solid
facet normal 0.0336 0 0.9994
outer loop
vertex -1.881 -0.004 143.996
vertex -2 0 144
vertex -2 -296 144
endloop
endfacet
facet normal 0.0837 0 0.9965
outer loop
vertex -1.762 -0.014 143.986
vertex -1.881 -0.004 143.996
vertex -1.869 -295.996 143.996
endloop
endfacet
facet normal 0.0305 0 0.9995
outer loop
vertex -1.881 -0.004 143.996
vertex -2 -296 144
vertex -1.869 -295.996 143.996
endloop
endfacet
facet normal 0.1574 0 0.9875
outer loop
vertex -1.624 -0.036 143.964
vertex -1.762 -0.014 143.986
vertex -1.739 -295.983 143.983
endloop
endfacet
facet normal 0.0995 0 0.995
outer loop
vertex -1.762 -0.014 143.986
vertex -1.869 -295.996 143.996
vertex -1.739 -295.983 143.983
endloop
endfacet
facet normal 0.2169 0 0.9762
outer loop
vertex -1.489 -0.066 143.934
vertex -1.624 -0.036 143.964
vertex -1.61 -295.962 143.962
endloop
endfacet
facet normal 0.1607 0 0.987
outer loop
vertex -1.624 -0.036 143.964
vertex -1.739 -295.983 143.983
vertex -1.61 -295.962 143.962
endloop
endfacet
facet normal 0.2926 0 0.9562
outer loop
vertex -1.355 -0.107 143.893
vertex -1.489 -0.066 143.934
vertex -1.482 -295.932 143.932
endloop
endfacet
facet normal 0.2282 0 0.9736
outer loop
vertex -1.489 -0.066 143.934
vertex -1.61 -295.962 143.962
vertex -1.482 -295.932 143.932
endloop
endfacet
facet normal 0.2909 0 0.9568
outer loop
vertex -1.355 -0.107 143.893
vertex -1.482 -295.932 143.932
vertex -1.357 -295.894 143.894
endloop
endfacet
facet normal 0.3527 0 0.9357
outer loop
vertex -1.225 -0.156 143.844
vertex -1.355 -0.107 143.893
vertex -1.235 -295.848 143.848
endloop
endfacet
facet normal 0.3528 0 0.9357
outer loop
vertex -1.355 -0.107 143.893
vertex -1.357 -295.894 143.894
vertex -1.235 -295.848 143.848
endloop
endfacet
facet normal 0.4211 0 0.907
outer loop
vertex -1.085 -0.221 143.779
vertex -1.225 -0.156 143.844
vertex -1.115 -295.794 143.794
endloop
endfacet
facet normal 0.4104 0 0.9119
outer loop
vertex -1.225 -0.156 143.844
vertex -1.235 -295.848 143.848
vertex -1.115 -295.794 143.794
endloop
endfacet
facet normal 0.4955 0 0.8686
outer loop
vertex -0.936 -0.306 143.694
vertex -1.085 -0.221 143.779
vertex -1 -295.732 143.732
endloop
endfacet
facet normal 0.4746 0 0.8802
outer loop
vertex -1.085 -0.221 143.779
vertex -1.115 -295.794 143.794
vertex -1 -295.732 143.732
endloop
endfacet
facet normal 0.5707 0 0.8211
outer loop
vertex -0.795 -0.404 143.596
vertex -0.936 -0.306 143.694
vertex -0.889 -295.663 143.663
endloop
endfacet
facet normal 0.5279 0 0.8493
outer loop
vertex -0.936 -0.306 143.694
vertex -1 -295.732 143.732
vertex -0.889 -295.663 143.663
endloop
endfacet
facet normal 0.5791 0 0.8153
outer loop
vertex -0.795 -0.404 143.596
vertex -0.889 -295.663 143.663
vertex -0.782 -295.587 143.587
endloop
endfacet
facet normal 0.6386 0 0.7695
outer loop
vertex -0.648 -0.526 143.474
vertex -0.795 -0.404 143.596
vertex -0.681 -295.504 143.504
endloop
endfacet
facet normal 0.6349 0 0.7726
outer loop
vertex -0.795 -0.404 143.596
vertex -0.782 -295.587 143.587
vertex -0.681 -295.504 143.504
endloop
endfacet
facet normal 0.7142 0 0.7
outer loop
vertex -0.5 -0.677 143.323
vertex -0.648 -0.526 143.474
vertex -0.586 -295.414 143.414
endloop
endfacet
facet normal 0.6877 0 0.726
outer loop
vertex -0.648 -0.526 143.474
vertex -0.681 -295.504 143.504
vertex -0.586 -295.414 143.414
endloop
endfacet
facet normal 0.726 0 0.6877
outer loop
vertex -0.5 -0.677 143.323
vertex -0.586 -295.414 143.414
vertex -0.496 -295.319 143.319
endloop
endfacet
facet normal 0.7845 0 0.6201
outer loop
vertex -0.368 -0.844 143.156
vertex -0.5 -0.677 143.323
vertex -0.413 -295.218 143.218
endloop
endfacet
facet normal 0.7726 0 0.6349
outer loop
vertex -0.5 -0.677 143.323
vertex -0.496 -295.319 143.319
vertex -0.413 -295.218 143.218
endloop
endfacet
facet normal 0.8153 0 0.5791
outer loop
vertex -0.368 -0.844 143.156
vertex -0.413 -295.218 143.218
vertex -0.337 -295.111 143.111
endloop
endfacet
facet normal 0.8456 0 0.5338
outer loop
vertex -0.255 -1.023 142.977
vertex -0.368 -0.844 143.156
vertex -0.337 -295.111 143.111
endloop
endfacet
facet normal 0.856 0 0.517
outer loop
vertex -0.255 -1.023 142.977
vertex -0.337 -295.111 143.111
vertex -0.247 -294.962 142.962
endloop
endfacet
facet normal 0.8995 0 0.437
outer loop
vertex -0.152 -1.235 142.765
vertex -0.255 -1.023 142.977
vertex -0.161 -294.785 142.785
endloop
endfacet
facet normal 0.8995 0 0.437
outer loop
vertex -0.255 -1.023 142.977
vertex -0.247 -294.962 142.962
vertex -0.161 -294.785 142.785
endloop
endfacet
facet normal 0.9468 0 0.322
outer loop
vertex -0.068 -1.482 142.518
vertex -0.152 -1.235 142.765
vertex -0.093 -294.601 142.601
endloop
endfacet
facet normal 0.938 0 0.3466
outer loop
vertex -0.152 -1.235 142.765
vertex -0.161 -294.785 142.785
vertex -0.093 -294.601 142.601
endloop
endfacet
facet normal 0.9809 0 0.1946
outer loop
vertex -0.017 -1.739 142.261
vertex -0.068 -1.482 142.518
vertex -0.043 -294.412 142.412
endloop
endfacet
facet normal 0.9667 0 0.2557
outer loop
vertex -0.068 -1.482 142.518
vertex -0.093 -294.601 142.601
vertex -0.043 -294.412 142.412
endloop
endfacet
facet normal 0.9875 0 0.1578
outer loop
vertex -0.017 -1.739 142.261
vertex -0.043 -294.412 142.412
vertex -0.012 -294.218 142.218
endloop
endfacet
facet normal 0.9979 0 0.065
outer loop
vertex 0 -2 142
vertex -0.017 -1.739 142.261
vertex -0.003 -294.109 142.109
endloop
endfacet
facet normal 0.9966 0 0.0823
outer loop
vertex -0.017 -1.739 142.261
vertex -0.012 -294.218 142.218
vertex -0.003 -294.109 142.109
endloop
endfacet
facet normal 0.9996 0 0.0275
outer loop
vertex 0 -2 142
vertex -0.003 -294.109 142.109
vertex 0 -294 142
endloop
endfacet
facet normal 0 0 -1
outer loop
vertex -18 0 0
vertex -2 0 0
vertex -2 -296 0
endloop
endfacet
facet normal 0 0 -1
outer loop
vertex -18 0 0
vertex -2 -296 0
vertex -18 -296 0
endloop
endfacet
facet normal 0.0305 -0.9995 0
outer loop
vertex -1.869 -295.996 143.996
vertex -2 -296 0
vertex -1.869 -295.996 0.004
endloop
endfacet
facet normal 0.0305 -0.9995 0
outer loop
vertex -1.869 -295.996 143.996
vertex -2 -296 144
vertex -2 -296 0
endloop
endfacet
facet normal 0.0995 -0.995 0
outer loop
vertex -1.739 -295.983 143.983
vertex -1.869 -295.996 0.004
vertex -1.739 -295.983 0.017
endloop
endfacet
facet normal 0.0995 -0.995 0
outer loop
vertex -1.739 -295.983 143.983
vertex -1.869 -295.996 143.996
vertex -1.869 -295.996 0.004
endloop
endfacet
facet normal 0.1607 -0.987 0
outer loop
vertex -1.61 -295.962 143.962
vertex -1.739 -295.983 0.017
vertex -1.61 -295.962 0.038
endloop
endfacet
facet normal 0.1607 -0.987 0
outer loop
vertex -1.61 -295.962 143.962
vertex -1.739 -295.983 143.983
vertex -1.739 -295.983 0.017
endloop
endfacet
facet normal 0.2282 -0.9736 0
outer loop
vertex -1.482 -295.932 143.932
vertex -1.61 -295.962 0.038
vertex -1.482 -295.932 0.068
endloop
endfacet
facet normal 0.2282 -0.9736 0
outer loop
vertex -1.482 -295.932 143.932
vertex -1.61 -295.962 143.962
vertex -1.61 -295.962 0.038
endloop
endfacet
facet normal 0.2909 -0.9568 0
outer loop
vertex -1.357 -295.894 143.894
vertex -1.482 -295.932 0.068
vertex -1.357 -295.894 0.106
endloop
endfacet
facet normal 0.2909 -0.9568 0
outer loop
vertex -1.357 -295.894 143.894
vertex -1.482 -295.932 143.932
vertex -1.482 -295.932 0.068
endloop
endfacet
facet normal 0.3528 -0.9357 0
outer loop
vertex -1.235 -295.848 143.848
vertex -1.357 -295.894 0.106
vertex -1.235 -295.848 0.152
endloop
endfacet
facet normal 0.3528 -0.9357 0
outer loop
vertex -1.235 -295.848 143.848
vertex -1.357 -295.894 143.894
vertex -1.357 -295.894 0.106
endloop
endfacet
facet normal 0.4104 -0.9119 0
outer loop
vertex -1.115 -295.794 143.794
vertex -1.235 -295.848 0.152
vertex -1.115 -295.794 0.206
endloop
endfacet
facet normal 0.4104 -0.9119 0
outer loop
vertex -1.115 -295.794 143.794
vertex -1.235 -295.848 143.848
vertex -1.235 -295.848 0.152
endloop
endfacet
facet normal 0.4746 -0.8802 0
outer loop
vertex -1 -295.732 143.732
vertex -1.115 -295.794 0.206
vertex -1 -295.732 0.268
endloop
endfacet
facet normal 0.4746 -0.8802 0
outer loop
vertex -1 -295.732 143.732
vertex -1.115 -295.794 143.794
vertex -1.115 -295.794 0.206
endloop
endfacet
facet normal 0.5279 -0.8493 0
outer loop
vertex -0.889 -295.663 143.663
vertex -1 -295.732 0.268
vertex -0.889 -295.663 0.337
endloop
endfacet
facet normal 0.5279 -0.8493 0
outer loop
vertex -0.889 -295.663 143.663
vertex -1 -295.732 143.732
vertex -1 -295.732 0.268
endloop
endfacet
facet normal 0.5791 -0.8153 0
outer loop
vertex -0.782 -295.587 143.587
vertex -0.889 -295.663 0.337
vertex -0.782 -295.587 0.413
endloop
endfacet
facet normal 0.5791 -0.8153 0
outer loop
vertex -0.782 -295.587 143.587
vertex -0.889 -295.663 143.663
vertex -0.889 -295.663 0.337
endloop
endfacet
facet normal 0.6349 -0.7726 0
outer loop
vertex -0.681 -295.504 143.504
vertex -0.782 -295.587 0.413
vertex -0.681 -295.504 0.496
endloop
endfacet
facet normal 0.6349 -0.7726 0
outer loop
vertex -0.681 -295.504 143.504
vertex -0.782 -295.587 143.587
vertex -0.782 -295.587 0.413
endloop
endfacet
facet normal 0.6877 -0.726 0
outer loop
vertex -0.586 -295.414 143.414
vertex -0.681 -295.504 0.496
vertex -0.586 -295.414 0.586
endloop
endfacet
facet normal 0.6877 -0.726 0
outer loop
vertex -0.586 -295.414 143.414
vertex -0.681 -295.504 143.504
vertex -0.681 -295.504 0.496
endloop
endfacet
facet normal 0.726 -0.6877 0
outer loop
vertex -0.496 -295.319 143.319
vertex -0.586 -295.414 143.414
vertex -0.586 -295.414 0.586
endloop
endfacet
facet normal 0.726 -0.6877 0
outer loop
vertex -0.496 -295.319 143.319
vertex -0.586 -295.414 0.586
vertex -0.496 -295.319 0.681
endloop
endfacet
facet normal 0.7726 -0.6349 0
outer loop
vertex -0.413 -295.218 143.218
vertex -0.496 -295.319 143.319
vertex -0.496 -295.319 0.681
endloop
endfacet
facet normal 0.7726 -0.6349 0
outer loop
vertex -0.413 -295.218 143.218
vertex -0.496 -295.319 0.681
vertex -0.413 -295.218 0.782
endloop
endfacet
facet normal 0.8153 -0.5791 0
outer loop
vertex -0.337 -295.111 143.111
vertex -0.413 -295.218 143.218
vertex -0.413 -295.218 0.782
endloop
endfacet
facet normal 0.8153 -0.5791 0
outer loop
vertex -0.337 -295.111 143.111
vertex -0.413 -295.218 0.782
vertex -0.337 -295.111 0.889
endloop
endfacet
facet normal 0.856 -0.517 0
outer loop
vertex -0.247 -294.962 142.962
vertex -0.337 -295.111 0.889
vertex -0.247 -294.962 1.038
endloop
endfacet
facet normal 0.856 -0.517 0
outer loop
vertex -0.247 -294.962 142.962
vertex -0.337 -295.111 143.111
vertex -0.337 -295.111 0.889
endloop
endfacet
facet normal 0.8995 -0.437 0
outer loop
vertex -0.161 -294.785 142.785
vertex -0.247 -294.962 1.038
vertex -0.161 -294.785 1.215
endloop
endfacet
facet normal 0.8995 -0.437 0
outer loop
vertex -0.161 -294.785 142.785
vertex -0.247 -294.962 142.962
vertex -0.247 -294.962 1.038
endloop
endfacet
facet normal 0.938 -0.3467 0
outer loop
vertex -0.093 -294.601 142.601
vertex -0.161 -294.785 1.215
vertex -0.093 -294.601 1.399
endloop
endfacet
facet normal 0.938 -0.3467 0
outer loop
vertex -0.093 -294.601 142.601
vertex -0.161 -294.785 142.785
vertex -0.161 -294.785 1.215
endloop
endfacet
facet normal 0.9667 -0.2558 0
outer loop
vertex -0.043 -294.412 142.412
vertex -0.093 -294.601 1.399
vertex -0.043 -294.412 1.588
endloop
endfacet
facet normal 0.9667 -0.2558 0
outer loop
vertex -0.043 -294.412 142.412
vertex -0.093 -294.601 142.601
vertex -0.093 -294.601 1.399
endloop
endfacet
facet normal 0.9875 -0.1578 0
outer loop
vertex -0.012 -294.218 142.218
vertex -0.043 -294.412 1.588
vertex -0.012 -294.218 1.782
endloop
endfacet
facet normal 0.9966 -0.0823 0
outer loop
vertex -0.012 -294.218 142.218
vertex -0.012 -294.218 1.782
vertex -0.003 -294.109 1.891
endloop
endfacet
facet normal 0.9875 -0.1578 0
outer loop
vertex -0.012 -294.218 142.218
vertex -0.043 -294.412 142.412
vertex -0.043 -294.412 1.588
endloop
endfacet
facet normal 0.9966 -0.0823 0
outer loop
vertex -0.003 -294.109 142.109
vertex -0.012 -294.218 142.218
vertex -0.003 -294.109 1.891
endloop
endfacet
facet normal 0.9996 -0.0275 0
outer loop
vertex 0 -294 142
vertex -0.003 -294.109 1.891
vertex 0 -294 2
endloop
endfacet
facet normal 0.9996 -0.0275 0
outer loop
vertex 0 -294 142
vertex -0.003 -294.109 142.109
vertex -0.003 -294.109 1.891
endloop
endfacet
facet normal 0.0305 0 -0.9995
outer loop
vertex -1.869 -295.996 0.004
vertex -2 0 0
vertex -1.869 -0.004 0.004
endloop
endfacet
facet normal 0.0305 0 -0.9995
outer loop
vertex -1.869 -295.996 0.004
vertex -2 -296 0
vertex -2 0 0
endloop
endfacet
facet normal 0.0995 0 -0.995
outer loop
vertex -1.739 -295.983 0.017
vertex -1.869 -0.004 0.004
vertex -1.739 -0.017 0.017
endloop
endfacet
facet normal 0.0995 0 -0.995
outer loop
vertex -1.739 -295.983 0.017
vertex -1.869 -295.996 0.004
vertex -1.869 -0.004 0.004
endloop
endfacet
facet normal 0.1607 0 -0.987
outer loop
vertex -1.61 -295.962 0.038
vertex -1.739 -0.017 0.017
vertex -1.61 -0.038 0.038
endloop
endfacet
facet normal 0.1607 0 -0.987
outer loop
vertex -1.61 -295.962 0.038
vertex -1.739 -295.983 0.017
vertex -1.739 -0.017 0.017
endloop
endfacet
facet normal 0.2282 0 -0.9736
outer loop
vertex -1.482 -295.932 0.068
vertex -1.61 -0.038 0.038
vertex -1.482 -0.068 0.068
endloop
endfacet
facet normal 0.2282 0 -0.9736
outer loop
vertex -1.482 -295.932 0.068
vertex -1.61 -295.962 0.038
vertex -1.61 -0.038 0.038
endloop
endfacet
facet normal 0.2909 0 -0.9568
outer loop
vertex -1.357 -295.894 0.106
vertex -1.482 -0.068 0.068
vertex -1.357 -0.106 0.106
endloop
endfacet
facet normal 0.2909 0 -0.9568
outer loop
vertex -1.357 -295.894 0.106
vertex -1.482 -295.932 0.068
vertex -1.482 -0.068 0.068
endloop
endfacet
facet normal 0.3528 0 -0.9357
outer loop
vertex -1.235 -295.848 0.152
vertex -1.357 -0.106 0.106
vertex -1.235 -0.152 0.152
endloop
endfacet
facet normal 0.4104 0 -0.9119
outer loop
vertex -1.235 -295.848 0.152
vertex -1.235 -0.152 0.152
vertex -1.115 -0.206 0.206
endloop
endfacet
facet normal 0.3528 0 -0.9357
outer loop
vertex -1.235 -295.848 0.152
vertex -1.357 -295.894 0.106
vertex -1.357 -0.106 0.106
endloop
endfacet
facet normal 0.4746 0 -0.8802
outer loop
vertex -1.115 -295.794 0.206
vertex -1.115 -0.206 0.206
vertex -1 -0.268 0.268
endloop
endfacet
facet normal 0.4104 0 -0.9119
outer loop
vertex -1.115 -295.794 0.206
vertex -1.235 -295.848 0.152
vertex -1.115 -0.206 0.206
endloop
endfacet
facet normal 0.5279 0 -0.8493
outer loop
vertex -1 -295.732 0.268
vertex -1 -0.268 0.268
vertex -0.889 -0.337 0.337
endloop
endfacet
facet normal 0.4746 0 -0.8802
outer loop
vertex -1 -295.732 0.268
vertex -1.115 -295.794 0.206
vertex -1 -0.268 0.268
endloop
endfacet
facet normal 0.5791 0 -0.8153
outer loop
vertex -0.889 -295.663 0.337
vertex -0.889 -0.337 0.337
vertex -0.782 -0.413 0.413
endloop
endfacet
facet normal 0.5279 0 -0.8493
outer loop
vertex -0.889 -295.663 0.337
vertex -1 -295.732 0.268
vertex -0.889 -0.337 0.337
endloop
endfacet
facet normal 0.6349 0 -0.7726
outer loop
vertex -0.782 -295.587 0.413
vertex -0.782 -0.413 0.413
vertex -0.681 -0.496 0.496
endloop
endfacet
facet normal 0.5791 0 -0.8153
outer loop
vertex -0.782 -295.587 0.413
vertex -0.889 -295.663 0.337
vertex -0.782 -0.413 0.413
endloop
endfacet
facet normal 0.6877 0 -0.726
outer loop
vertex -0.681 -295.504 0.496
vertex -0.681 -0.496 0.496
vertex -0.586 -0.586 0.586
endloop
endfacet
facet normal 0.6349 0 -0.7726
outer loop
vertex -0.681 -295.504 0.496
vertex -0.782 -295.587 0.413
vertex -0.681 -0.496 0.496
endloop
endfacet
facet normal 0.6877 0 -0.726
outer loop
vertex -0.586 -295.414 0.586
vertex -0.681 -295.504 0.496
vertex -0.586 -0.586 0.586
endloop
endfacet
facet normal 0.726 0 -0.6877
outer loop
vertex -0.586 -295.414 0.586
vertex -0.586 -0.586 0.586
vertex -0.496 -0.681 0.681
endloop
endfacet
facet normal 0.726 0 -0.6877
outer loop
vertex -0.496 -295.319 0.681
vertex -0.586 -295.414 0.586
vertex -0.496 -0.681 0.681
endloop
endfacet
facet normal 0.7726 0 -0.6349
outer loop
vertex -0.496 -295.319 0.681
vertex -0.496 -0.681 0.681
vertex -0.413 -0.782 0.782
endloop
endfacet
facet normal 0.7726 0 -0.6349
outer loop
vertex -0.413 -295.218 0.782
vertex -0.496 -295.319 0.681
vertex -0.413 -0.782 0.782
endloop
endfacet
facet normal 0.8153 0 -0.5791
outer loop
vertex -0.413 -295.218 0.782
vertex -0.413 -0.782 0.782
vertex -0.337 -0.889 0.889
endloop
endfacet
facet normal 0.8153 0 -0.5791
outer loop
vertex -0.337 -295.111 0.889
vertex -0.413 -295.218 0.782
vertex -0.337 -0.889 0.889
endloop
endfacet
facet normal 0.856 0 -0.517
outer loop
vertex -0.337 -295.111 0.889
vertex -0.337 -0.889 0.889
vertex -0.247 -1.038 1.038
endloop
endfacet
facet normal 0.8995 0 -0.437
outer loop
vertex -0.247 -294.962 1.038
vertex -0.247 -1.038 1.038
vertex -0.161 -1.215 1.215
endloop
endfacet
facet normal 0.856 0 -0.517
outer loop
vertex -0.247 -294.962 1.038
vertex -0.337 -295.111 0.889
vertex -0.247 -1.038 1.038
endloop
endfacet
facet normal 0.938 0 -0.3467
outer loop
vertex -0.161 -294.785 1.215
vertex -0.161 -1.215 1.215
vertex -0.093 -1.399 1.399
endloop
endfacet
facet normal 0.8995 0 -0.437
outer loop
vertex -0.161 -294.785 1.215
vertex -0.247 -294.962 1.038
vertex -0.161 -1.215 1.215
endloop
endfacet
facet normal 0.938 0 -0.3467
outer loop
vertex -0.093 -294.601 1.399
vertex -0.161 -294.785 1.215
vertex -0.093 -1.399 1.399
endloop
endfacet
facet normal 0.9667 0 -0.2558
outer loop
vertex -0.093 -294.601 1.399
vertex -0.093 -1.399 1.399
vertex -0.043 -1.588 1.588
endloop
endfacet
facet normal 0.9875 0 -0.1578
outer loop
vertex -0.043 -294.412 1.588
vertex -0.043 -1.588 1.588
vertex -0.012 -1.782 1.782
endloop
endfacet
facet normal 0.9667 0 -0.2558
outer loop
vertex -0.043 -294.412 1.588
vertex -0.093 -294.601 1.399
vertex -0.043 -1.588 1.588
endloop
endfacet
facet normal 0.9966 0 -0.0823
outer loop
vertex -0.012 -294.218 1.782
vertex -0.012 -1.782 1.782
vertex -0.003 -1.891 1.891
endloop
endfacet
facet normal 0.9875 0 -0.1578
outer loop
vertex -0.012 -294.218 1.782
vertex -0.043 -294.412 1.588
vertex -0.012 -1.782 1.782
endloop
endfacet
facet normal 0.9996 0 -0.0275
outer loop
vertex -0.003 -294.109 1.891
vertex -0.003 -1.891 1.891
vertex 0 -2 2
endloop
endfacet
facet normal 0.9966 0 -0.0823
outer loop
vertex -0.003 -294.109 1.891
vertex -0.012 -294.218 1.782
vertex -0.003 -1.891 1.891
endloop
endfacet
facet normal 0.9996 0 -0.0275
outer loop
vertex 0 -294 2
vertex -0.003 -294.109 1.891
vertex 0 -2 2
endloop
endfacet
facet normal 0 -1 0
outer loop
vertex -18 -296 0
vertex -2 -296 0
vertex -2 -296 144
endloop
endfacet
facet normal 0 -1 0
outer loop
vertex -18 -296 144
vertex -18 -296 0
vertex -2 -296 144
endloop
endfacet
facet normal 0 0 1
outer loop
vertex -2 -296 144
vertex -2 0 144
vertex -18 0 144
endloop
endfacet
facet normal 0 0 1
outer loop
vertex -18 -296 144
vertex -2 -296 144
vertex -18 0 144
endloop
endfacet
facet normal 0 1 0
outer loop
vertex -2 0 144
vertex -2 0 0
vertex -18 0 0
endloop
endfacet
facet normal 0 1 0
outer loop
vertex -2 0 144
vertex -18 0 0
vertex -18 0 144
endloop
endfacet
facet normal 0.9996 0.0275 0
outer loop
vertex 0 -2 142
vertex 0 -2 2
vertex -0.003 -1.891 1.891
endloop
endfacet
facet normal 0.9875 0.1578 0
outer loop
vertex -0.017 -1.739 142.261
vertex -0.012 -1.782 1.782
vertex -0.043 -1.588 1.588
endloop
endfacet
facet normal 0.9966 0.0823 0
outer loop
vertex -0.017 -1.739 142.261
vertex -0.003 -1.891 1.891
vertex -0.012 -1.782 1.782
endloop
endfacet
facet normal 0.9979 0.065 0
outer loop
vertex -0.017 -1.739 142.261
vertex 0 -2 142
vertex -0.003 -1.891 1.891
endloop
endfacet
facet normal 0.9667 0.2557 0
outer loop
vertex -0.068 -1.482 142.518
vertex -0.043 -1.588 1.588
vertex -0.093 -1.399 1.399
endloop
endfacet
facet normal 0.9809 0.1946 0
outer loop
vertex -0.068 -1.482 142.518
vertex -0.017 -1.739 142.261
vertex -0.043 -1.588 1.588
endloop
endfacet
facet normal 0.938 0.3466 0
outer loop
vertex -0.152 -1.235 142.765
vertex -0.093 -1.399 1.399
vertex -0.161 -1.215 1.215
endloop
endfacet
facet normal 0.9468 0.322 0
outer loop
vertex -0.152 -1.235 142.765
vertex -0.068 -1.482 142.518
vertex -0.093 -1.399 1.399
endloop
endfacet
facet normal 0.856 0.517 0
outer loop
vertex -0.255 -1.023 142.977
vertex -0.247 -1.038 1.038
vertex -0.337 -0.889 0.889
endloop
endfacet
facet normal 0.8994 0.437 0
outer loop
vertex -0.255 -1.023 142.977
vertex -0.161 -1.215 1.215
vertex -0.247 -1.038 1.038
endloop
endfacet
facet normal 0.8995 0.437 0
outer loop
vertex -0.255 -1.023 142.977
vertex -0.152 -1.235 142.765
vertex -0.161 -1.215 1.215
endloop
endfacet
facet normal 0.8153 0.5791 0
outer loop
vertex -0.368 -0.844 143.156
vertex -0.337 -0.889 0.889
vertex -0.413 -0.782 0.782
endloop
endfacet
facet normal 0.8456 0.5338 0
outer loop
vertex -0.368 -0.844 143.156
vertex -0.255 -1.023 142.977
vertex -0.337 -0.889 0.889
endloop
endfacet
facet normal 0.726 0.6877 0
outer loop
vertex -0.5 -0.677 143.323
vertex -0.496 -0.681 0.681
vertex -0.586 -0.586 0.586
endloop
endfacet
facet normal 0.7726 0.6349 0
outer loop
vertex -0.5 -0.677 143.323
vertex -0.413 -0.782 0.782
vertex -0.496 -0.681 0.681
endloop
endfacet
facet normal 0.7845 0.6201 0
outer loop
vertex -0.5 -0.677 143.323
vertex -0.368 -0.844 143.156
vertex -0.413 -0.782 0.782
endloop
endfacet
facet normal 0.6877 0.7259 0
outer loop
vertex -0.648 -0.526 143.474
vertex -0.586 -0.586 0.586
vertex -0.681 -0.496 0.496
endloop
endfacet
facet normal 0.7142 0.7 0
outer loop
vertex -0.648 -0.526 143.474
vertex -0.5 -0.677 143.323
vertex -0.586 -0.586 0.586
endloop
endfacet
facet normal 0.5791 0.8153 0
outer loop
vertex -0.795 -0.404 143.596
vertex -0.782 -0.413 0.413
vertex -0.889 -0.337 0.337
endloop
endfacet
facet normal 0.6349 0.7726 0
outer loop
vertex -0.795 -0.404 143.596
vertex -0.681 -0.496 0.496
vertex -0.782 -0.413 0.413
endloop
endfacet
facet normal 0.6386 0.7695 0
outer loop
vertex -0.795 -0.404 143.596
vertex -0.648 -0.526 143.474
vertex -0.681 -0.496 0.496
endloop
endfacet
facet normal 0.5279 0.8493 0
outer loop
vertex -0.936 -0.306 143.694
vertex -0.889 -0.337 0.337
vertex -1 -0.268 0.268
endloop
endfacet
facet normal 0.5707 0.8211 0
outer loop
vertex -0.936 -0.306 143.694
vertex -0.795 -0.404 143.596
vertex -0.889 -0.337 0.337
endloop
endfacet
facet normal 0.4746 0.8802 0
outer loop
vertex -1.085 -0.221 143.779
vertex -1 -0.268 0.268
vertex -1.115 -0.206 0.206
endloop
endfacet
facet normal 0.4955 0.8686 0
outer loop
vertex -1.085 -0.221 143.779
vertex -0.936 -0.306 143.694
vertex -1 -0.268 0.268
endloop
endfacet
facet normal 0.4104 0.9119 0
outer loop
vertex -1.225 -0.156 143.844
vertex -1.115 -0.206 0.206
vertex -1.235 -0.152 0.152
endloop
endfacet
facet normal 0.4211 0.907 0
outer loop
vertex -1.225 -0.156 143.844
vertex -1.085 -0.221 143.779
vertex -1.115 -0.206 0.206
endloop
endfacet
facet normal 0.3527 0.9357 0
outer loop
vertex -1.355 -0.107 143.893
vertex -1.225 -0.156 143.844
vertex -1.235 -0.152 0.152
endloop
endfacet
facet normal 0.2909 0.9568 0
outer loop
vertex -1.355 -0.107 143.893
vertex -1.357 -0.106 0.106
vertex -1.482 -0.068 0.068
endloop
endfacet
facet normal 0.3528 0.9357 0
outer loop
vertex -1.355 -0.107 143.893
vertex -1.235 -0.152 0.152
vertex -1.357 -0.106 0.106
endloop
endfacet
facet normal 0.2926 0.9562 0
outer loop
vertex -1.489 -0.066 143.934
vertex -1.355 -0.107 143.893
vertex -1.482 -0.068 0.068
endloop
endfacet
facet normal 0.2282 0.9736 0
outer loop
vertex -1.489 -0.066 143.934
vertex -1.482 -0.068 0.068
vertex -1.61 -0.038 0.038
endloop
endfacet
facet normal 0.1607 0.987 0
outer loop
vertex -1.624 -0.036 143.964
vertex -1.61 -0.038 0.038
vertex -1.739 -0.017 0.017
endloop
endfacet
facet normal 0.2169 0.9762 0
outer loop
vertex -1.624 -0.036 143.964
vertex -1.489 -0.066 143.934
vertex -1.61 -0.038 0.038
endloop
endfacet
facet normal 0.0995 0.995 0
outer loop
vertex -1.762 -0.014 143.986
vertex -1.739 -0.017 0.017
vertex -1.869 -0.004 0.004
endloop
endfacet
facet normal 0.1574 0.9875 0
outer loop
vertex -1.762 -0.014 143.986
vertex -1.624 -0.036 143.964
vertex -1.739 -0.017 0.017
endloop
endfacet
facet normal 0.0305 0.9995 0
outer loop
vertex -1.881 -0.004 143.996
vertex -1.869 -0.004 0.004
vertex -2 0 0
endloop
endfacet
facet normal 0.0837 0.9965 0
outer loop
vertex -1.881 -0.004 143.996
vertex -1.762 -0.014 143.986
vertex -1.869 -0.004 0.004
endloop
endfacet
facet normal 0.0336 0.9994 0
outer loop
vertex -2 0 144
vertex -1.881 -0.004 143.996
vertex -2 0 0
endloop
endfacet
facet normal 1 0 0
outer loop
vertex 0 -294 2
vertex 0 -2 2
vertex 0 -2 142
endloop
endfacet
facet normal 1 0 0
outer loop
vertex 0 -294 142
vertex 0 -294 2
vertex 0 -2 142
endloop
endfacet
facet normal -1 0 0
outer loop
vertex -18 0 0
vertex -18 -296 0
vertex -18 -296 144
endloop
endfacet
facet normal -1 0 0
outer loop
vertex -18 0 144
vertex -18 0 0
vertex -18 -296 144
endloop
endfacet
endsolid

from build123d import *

# Parameters (mm, degrees)
F0_W     = 43.0421233177
F0_H     = 34.4761312008
F1_DEPTH = 25
F2_DEPTH = 144
F3_DEPTH = 18
F4_DEPTH = 296
F5_R     = 2


with BuildPart() as f1:
    # F0 (on Right) → F1 (new body)
    with BuildSketch(Plane.YZ):
        with Locations((-21.5210616589, 17.2380656004)):
            Rectangle(F0_W, F0_H)
    extrude(amount=-F1_DEPTH)

    # F2 (add): a face of the model
    f2_faces = [f1.faces().sort_by_distance(p)[0] for p in [
        (-12.5, -21.5210616589, 0),
    ]]
    extrude(f2_faces, amount=-F2_DEPTH)

    # F3 (intersect): a face of the model
    f3_faces = [f1.faces().sort_by_distance(p)[0] for p in [
        (0, -21.5210616589, 72),
    ]]
    extrude(f3_faces, amount=-F3_DEPTH, mode=Mode.INTERSECT)

    # F4 (add): a face of the model
    f4_faces = [f1.faces().sort_by_distance(p)[0] for p in [
        (-9, 0, 72),
    ]]
    extrude(f4_faces, amount=-F4_DEPTH)

    # F5
    f5_edges = [f1.edges().sort_by_distance(p)[0] for p in [
        (0, -148, 0),
        (0, 0, 72),
        (0, -148, 144),
        (0, -296, 72),
    ]]
    fillet(f5_edges, radius=F5_R)


solid = f1.part
